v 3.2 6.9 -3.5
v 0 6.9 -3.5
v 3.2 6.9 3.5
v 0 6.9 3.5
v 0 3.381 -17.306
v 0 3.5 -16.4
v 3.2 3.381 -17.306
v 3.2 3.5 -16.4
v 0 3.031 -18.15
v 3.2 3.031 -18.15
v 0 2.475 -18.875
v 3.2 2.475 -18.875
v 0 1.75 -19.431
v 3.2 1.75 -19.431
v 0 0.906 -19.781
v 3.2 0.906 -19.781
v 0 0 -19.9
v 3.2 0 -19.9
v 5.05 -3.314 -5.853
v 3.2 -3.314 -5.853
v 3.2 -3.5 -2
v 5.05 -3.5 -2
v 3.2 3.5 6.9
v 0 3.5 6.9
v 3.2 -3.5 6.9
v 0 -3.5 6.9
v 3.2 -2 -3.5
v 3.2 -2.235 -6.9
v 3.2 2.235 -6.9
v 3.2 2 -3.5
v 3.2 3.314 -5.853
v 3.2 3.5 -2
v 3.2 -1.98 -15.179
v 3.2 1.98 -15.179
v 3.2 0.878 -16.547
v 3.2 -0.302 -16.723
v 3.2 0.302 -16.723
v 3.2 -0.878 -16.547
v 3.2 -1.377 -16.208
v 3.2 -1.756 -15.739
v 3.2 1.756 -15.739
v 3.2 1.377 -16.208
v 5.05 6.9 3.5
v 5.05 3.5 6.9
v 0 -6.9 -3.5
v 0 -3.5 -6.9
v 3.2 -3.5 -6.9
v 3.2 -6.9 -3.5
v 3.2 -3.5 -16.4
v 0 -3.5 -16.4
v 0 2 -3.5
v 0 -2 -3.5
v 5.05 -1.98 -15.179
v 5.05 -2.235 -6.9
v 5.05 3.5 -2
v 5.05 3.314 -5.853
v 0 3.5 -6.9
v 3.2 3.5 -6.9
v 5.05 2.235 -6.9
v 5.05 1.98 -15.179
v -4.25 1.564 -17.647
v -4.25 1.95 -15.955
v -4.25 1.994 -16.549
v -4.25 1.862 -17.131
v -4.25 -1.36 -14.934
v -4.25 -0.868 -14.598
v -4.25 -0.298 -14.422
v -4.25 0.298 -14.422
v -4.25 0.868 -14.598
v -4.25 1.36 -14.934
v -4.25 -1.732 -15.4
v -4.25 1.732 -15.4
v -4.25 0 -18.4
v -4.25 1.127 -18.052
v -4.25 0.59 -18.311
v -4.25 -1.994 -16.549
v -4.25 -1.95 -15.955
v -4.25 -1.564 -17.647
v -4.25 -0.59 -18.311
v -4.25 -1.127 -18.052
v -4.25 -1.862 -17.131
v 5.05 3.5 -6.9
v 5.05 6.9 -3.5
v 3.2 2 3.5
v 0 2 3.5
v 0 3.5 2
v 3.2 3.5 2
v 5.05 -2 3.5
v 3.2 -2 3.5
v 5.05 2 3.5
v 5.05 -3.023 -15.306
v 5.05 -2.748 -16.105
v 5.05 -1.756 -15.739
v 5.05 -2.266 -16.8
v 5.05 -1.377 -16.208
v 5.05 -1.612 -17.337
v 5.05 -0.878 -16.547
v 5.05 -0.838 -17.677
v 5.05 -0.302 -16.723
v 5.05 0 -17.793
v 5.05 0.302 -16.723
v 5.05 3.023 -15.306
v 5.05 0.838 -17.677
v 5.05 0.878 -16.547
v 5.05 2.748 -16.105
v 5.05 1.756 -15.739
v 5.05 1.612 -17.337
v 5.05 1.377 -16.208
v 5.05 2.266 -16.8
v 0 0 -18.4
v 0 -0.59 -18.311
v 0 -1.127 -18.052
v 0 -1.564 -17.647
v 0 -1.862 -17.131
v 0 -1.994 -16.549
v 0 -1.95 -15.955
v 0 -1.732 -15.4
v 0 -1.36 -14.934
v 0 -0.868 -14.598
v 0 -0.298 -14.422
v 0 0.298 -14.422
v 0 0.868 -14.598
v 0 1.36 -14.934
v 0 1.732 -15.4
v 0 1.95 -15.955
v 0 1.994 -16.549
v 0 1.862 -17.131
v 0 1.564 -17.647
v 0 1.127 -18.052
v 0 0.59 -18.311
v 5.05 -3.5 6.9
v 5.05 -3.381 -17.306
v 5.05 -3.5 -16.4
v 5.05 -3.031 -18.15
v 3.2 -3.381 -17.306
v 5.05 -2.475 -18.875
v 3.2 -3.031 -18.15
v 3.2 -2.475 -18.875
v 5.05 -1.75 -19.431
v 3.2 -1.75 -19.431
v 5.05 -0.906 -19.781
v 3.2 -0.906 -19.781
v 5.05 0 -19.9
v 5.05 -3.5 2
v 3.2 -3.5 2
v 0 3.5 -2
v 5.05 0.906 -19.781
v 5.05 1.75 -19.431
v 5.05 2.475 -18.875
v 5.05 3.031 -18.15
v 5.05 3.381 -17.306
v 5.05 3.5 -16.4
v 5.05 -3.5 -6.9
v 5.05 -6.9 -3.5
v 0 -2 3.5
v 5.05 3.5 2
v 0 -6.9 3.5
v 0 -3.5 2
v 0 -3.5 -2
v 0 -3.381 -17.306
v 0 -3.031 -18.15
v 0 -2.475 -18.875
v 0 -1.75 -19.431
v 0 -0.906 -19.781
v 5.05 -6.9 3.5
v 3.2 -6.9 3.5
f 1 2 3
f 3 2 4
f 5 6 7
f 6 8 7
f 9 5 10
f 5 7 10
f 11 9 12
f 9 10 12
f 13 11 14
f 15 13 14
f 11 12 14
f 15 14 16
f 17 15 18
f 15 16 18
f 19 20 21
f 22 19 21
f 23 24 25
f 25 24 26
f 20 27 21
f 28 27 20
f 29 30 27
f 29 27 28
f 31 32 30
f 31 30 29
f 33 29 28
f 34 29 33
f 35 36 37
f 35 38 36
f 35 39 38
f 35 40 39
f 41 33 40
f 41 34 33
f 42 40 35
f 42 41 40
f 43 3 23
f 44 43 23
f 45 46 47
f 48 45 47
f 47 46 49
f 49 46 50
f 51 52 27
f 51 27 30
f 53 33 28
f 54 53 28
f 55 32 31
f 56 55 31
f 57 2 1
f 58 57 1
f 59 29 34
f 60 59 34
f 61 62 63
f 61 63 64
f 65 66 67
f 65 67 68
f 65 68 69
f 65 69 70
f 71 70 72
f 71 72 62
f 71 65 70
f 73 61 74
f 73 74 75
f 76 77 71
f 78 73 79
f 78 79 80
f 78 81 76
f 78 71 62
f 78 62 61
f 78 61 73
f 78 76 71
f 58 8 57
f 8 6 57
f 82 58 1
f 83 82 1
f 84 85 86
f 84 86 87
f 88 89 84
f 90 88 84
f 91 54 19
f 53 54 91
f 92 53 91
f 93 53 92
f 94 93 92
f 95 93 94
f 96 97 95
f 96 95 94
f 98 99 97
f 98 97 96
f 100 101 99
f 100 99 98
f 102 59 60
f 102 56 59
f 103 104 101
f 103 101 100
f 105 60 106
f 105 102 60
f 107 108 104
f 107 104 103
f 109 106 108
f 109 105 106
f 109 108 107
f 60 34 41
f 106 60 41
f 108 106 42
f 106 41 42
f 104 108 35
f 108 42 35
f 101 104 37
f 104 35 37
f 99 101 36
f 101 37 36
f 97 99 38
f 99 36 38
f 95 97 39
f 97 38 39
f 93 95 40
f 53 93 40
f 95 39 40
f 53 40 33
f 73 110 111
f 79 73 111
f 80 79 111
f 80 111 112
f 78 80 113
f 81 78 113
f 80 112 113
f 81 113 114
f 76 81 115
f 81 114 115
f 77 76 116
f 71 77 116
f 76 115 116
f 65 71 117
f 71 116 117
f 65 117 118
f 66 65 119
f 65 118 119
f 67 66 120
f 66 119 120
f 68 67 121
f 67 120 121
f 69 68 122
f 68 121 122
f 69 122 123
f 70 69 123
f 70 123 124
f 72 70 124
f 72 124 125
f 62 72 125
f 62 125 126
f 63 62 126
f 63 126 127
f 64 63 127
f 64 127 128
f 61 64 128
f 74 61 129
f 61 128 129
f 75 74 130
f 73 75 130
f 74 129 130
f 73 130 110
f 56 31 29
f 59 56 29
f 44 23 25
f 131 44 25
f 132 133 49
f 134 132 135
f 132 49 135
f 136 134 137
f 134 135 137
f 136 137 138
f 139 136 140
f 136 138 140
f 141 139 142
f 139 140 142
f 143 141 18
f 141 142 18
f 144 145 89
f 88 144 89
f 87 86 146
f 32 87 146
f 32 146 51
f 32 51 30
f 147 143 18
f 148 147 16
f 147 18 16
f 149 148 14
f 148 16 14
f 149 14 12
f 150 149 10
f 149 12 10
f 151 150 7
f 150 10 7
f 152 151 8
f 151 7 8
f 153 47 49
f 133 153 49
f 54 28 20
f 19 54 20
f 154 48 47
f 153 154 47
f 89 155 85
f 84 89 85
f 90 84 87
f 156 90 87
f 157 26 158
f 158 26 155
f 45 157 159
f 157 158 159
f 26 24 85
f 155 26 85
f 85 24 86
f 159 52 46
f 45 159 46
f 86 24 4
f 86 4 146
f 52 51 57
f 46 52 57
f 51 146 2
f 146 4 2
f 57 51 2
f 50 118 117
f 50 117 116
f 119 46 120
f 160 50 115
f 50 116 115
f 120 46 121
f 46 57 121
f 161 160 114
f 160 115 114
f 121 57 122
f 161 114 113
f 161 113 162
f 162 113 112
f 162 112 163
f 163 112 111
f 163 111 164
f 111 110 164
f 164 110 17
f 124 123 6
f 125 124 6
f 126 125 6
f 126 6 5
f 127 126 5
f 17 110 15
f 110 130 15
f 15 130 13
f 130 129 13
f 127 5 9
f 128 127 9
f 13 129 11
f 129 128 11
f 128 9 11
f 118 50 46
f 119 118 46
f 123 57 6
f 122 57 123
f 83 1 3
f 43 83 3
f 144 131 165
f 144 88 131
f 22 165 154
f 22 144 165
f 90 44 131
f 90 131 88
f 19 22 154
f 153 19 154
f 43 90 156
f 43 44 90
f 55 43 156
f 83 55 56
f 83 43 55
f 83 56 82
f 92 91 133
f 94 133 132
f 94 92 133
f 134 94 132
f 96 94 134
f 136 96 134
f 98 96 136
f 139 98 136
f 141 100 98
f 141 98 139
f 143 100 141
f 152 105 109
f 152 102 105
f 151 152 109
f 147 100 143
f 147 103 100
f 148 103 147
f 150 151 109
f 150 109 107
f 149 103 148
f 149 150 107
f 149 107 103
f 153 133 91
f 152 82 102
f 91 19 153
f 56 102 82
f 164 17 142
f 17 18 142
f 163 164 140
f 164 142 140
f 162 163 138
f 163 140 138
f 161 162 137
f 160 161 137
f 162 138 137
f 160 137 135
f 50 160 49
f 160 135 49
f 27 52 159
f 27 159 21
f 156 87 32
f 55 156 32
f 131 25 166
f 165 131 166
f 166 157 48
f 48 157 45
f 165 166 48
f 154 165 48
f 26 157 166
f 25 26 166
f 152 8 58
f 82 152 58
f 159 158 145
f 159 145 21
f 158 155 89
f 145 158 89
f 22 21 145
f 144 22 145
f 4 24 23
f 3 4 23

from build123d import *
from build123d.topology import SkipClean

# Parameters (mm, degrees)
SKETCH1_W           = 7
SKETCH1_H           = 7
BOSS_EXTRUDE1_DEPTH = 3.2
CHAMFER1_SIZE       = 1.5
FILLET1_R           = 3.5
CHAMFER2_SIZE       = 3.4
SKETCH3_R           = 2
BOSS_EXTRUDE2_DEPTH = 4.25
BOSS_EXTRUDE3_DEPTH = 1.85
BOSS_EXTRUDE4_DEPTH = 1.85


with BuildPart() as part:
    # Sketch1 → Boss-Extrude1 (new body)
    with BuildSketch(Plane(origin=(0, 0, 0), x_dir=(0, 0, -1), z_dir=(1, 0, 0))):
        Polygon((6.9, 3.5), (6.9, 6.9), (-6.9, 6.9), (-6.9, -6.9), (6.9, -6.9), (6.9, -3.5), (19.9, -3.5), (19.9, 3.5), align=None)
        Rectangle(SKETCH1_W, SKETCH1_H, mode=Mode.SUBTRACT)
    extrude(amount=BOSS_EXTRUDE1_DEPTH)

    # Chamfer1
    chamfer1_edges = [part.edges().sort_by_distance(p)[0] for p in [
        (1.6, -3.5, -3.5),
        (1.6, 3.5, -3.5),
        (1.6, 3.5, 3.5),
        (1.6, -3.5, 3.5),
    ]]
    chamfer(chamfer1_edges, length=CHAMFER1_SIZE)

    # Fillet1
    fillet1_edges = [part.edges().sort_by_distance(p)[0] for p in [
        (1.6, -3.5, -19.9),
        (1.6, 3.5, -19.9),
    ]]
    fillet(fillet1_edges, radius=FILLET1_R - 0.0001)  # a hair under: the kernel refuses the full size

    # Chamfer2
    chamfer2_edges = [part.edges().sort_by_distance(p)[0] for p in [
        (1.6, -6.9, -6.9),
        (1.6, -6.9, 6.9),
        (1.6, 6.9, 6.9),
        (1.6, 6.9, -6.9),
    ]]
    chamfer(chamfer2_edges, length=CHAMFER2_SIZE - 0.0001)  # a hair under: the kernel refuses the full size

    # Sketch3 → Boss-Extrude2 (add)
    with BuildSketch(Plane.ZY):
        with Locations(Location((-16.4, 0, 0), (0, 0, 180))):
            Circle(SKETCH3_R)
    extrude(amount=BOSS_EXTRUDE2_DEPTH)

    # Sketch4 → Boss-Extrude3 (add)
    with BuildSketch(Plane(origin=(3.2, 0, 0), x_dir=(0, 0, -1), z_dir=(1, 0, 0))):
        with BuildLine():
            Line((6.9, 2.234550653), (15.178957615, 1.979760355))
            ThreePointArc((15.178957615, 1.979760355), (16.745857217, 0), (15.178957615, -1.979760355))
            Line((15.178957615, -1.979760355), (6.9, -2.234550653))
            Line((6.9, -2.234550653), (5.852935753, -3.314334724))
            Line((5.852935753, -3.314334724), (15.305699084, -3.023419792))
            ThreePointArc((15.305699084, -3.023419792), (17.792921464, 0), (15.305699084, 3.023419792))
            Line((15.305699084, 3.023419792), (5.852935753, 3.314334724))
            Line((5.852935753, 3.314334724), (6.9, 2.234550653))
        make_face()
    extrude(amount=BOSS_EXTRUDE3_DEPTH)

    # Sketch5 → Boss-Extrude4 (add)
    with SkipClean():  # the faces are left unmerged after this step: merging them gives an invalid solid
        with BuildSketch(Plane(origin=(3.2, 0, 0), x_dir=(0, 0, -1), z_dir=(1, 0, 0))):
            with BuildLine():
                Line((-6.9, -3.5), (-3.5, -6.9))
                Line((-3.5, -6.9), (3.5, -6.9))
                Line((3.5, -6.9), (6.9, -3.5))
                Line((6.9, -3.5), (16.4, -3.5))
                ThreePointArc((16.4, -3.5), (18.874873734, -2.474873734), (19.9, 0))
                ThreePointArc((19.9, 0), (18.874873734, 2.474873734), (16.4, 3.5))
                Line((16.4, 3.5), (6.9, 3.5))
                Line((6.9, 3.5), (3.5, 6.9))
                Line((3.5, 6.9), (-3.5, 6.9))
                Line((-3.5, 6.9), (-6.9, 3.5))
                Line((-6.9, 3.5), (-6.9, -3.5))
            make_face()
            with BuildLine():
                Line((5.852935753, -3.314334724), (2, -3.5))
                Line((2, -3.5), (-2, -3.5))
                Line((-2, -3.5), (-3.5, -2))
                Line((-3.5, -2), (-3.5, 2))
                Line((-3.5, 2), (-2, 3.5))
                Line((-2, 3.5), (2, 3.5))
                Line((2, 3.5), (5.852935753, 3.314334724))
                Line((5.852935753, 3.314334724), (15.305699084, 3.023419792))
                ThreePointArc((15.305699084, 3.023419792), (17.792921464, 0), (15.305699084, -3.023419792))
                Line((15.305699084, -3.023419792), (5.852935753, -3.314334724))
            make_face(mode=Mode.SUBTRACT)
        extrude(amount=BOSS_EXTRUDE4_DEPTH)


solid = part.part
